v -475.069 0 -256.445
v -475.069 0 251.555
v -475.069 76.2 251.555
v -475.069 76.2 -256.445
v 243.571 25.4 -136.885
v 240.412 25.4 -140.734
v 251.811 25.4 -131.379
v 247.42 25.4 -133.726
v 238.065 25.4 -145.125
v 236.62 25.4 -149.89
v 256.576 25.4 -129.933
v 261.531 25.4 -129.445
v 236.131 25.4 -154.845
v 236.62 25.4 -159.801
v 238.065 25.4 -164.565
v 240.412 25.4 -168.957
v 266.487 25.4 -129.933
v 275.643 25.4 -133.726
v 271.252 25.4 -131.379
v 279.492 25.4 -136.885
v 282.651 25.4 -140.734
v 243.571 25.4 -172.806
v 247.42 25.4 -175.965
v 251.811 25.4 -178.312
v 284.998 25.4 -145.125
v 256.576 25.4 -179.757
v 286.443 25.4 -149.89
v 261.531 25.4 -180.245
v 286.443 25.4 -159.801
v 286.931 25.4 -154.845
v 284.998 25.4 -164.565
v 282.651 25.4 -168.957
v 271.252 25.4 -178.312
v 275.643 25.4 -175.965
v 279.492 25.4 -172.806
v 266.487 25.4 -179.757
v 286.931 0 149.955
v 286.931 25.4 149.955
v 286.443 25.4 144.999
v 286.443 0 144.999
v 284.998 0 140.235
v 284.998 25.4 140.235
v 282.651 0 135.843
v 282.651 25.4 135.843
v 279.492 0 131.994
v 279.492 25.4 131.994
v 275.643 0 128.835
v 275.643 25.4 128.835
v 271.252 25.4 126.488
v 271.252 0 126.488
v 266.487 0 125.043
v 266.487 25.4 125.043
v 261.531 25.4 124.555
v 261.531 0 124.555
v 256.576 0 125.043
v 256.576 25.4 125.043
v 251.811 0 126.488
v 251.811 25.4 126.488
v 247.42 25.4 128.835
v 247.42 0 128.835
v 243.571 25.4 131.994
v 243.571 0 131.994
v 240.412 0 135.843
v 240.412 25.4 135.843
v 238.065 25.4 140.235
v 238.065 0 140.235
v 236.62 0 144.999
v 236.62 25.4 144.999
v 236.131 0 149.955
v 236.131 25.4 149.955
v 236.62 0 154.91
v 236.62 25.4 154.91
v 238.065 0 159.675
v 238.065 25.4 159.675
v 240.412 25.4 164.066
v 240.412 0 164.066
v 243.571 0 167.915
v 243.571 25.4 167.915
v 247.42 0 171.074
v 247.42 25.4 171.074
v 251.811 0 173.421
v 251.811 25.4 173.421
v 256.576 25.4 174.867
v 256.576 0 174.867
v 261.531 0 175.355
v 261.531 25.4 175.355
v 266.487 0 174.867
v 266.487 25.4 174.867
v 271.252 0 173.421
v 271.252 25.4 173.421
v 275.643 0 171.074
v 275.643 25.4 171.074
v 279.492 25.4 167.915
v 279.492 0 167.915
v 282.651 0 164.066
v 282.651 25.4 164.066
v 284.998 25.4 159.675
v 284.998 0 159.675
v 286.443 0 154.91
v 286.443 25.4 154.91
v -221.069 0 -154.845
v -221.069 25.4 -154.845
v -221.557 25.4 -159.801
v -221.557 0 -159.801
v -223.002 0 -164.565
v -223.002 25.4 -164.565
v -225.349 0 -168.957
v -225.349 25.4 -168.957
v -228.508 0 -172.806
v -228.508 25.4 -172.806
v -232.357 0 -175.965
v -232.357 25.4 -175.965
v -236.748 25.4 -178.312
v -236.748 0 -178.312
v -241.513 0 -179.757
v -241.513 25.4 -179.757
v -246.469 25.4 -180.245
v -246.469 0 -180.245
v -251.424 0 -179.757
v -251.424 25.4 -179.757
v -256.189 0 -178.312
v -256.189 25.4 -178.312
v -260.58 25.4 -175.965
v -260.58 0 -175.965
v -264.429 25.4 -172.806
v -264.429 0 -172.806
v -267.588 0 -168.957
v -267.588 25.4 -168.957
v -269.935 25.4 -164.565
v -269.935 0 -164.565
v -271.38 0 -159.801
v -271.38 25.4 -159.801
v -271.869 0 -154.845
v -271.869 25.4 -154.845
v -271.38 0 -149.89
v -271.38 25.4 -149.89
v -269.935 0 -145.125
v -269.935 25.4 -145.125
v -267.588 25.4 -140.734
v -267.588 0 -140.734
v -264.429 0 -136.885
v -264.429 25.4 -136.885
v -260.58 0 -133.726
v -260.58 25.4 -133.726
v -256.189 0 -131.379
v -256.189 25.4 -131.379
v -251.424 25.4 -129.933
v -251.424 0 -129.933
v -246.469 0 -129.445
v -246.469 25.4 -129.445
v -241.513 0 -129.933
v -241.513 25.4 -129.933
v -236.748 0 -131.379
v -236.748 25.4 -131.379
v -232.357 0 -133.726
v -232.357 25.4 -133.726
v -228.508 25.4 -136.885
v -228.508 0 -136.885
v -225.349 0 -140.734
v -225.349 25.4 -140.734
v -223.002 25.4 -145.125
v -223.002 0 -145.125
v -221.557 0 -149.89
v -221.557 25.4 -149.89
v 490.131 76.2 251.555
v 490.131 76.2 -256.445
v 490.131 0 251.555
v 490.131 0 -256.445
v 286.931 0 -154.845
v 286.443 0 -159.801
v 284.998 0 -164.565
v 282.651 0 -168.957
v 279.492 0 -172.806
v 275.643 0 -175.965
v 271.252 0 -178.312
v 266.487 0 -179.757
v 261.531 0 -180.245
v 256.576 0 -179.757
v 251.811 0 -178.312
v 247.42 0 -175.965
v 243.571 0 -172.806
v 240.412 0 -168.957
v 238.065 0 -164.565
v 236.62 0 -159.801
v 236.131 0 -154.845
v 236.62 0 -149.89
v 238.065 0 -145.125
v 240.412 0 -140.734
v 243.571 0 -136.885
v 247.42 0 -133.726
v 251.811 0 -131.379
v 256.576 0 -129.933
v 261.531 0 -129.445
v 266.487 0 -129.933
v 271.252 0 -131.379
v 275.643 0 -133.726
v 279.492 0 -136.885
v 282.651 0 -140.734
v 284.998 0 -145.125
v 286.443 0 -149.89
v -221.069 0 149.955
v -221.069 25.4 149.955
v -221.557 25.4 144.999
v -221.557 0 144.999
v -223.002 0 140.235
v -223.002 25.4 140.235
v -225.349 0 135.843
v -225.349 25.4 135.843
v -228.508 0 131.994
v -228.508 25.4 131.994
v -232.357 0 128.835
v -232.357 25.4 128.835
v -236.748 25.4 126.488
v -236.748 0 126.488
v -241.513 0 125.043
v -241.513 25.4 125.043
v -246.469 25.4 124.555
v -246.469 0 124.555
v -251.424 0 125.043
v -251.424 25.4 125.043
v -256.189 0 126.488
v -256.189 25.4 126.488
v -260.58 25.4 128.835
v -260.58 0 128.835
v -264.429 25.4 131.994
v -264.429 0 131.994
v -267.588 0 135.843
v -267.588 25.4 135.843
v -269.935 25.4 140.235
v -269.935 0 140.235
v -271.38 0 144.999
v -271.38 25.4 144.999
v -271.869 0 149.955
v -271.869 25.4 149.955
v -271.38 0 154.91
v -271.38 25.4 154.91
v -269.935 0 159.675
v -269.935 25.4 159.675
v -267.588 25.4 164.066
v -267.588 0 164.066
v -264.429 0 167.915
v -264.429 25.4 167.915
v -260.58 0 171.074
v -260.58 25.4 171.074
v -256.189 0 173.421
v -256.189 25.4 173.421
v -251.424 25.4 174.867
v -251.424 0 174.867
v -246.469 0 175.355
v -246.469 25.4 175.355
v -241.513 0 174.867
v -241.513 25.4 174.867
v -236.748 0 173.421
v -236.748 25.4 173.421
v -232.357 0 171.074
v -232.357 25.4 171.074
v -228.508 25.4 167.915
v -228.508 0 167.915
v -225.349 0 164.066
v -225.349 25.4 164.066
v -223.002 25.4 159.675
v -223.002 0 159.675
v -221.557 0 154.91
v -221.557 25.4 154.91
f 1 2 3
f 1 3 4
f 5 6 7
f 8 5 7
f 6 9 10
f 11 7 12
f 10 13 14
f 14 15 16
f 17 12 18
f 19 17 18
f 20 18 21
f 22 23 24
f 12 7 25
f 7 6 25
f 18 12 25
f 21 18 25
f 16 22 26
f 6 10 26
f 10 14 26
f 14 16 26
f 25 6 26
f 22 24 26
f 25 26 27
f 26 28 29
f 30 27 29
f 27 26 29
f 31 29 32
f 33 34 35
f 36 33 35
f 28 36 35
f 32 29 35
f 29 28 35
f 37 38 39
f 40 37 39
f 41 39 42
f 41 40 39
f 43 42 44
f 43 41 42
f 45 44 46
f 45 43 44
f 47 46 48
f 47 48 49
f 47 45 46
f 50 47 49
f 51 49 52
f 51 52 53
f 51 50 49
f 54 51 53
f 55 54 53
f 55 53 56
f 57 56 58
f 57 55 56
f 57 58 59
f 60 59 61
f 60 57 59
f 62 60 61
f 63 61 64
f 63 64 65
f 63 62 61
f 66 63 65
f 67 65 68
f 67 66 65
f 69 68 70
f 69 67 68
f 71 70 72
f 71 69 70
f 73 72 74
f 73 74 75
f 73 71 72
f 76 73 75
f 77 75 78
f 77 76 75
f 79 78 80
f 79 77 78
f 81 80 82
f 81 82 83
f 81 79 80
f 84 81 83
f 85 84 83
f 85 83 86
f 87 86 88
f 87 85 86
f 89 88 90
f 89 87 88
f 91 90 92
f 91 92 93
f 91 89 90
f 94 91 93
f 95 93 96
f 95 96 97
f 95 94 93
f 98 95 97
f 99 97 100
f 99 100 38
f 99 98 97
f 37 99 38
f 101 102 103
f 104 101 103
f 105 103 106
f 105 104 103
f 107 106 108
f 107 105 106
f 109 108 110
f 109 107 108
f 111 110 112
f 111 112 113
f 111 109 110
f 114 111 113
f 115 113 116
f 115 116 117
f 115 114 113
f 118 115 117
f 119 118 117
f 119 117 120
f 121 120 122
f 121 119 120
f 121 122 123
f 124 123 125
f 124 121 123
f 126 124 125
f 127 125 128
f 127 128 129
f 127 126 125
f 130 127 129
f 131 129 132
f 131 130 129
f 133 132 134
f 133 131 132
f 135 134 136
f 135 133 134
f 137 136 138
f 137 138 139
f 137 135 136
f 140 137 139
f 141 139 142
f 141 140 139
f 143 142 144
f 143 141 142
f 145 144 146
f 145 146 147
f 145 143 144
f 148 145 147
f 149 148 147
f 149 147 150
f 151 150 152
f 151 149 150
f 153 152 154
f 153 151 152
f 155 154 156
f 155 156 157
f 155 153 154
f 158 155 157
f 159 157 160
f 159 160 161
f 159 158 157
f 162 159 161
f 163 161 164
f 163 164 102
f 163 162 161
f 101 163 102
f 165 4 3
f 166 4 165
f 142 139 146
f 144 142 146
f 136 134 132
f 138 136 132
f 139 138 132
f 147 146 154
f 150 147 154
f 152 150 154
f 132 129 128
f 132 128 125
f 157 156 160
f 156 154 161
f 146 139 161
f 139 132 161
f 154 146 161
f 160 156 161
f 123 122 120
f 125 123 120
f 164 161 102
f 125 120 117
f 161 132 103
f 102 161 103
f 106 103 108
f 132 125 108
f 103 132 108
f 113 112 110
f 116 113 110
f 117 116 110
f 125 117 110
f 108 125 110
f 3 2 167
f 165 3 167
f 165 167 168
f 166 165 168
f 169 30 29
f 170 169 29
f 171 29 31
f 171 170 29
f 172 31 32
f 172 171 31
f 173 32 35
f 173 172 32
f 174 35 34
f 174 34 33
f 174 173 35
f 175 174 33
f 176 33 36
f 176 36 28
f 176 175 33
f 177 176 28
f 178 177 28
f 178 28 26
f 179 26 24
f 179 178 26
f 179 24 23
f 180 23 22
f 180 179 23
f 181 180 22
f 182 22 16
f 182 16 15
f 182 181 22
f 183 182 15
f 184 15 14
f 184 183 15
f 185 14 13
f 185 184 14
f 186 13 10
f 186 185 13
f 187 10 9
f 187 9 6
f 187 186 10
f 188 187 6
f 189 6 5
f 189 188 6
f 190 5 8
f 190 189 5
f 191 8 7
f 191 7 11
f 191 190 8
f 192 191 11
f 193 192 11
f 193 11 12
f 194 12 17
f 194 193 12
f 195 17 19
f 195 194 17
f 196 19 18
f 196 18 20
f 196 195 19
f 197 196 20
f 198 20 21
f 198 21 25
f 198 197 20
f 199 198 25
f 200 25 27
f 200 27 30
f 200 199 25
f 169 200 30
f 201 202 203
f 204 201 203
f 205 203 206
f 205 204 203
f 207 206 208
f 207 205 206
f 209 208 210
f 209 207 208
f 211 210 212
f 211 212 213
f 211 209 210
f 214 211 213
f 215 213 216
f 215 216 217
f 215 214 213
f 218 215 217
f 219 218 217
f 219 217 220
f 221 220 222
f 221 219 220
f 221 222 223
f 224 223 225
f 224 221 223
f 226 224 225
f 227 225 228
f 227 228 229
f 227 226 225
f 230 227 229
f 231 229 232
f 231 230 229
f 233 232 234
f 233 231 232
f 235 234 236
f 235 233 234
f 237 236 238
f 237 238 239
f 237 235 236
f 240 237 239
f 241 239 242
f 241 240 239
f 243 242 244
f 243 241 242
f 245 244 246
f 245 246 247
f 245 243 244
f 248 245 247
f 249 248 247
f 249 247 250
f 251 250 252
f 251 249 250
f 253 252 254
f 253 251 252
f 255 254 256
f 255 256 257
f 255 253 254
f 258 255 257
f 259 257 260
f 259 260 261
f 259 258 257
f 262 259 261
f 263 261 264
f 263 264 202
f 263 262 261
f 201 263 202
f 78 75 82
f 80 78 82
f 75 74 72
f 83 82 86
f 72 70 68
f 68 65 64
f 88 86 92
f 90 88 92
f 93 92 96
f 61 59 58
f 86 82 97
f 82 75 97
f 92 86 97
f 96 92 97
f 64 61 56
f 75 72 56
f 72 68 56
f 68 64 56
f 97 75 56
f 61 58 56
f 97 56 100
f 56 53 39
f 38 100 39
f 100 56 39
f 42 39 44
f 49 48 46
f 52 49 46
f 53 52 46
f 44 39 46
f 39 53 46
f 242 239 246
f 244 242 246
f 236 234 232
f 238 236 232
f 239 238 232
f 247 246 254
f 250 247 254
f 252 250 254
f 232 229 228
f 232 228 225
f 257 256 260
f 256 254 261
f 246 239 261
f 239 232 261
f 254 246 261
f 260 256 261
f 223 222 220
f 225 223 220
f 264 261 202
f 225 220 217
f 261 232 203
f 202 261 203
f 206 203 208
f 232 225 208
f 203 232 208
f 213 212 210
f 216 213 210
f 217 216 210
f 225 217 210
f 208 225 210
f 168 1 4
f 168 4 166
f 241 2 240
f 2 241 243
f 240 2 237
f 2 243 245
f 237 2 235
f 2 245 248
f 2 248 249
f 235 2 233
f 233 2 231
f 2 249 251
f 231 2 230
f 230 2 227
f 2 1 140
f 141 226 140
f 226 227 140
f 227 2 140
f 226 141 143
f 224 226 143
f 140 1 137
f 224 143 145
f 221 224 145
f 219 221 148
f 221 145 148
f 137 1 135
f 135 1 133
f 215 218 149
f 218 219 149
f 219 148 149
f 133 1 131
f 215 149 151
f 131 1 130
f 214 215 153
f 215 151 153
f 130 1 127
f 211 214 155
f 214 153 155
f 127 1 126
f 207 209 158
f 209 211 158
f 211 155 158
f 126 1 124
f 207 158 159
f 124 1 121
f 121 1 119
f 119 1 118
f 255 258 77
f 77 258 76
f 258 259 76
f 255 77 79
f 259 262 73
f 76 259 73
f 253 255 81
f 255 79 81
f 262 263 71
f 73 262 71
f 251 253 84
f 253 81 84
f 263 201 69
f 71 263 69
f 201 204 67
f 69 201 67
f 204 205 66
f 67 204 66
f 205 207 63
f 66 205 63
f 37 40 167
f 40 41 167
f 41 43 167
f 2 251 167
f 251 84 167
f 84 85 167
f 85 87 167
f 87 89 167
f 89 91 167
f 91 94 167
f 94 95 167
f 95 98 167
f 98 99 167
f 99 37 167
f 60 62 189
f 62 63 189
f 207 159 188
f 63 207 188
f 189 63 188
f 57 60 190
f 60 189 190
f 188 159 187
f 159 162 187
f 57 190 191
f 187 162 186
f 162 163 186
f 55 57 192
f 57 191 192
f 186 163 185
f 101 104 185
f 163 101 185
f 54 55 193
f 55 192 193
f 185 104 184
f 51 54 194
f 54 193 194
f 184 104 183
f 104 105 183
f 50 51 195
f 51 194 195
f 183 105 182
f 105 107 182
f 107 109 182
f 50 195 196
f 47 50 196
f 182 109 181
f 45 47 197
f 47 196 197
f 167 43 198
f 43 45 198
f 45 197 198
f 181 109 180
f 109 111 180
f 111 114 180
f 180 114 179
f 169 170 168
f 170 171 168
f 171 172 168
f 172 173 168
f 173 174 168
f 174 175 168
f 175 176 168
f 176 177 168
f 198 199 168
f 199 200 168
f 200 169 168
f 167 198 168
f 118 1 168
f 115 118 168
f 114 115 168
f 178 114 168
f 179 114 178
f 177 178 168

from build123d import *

# Parameters (mm, degrees)
SKETCH1_W           = 965.2
SKETCH1_H           = 508
BOSS_EXTRUDE1_DEPTH = 76.2
SKETCH1_5_R         = 25.4
CUT_EXTRUDE1_DEPTH  = 25.4


with BuildPart() as part:
    # Sketch1 → Boss-Extrude1 (new body)
    with BuildSketch(Plane(origin=(0, 0, 0), x_dir=(1, 0, 0), z_dir=(0, 1, 0))):
        with Locations((7.531475682, 2.445222165)):
            Rectangle(SKETCH1_W, SKETCH1_H)
    extrude(amount=BOSS_EXTRUDE1_DEPTH)

    # Sketch1<5> → Cut-Extrude1 (cut)
    with BuildSketch(Plane(origin=(0, 0, 0), x_dir=(1, 0, 0), z_dir=(0, 1, 0))):
        with Locations((-246.468524318, 154.845222165)):
            Circle(SKETCH1_5_R)
        with Locations((261.531475682, 154.845222165)):
            Circle(SKETCH1_5_R)
        with Locations((261.531475682, -149.954777835)):
            Circle(SKETCH1_5_R)
        with Locations((-246.468524318, -149.954777835)):
            Circle(SKETCH1_5_R)
    extrude(amount=CUT_EXTRUDE1_DEPTH, mode=Mode.SUBTRACT)


solid = part.part
